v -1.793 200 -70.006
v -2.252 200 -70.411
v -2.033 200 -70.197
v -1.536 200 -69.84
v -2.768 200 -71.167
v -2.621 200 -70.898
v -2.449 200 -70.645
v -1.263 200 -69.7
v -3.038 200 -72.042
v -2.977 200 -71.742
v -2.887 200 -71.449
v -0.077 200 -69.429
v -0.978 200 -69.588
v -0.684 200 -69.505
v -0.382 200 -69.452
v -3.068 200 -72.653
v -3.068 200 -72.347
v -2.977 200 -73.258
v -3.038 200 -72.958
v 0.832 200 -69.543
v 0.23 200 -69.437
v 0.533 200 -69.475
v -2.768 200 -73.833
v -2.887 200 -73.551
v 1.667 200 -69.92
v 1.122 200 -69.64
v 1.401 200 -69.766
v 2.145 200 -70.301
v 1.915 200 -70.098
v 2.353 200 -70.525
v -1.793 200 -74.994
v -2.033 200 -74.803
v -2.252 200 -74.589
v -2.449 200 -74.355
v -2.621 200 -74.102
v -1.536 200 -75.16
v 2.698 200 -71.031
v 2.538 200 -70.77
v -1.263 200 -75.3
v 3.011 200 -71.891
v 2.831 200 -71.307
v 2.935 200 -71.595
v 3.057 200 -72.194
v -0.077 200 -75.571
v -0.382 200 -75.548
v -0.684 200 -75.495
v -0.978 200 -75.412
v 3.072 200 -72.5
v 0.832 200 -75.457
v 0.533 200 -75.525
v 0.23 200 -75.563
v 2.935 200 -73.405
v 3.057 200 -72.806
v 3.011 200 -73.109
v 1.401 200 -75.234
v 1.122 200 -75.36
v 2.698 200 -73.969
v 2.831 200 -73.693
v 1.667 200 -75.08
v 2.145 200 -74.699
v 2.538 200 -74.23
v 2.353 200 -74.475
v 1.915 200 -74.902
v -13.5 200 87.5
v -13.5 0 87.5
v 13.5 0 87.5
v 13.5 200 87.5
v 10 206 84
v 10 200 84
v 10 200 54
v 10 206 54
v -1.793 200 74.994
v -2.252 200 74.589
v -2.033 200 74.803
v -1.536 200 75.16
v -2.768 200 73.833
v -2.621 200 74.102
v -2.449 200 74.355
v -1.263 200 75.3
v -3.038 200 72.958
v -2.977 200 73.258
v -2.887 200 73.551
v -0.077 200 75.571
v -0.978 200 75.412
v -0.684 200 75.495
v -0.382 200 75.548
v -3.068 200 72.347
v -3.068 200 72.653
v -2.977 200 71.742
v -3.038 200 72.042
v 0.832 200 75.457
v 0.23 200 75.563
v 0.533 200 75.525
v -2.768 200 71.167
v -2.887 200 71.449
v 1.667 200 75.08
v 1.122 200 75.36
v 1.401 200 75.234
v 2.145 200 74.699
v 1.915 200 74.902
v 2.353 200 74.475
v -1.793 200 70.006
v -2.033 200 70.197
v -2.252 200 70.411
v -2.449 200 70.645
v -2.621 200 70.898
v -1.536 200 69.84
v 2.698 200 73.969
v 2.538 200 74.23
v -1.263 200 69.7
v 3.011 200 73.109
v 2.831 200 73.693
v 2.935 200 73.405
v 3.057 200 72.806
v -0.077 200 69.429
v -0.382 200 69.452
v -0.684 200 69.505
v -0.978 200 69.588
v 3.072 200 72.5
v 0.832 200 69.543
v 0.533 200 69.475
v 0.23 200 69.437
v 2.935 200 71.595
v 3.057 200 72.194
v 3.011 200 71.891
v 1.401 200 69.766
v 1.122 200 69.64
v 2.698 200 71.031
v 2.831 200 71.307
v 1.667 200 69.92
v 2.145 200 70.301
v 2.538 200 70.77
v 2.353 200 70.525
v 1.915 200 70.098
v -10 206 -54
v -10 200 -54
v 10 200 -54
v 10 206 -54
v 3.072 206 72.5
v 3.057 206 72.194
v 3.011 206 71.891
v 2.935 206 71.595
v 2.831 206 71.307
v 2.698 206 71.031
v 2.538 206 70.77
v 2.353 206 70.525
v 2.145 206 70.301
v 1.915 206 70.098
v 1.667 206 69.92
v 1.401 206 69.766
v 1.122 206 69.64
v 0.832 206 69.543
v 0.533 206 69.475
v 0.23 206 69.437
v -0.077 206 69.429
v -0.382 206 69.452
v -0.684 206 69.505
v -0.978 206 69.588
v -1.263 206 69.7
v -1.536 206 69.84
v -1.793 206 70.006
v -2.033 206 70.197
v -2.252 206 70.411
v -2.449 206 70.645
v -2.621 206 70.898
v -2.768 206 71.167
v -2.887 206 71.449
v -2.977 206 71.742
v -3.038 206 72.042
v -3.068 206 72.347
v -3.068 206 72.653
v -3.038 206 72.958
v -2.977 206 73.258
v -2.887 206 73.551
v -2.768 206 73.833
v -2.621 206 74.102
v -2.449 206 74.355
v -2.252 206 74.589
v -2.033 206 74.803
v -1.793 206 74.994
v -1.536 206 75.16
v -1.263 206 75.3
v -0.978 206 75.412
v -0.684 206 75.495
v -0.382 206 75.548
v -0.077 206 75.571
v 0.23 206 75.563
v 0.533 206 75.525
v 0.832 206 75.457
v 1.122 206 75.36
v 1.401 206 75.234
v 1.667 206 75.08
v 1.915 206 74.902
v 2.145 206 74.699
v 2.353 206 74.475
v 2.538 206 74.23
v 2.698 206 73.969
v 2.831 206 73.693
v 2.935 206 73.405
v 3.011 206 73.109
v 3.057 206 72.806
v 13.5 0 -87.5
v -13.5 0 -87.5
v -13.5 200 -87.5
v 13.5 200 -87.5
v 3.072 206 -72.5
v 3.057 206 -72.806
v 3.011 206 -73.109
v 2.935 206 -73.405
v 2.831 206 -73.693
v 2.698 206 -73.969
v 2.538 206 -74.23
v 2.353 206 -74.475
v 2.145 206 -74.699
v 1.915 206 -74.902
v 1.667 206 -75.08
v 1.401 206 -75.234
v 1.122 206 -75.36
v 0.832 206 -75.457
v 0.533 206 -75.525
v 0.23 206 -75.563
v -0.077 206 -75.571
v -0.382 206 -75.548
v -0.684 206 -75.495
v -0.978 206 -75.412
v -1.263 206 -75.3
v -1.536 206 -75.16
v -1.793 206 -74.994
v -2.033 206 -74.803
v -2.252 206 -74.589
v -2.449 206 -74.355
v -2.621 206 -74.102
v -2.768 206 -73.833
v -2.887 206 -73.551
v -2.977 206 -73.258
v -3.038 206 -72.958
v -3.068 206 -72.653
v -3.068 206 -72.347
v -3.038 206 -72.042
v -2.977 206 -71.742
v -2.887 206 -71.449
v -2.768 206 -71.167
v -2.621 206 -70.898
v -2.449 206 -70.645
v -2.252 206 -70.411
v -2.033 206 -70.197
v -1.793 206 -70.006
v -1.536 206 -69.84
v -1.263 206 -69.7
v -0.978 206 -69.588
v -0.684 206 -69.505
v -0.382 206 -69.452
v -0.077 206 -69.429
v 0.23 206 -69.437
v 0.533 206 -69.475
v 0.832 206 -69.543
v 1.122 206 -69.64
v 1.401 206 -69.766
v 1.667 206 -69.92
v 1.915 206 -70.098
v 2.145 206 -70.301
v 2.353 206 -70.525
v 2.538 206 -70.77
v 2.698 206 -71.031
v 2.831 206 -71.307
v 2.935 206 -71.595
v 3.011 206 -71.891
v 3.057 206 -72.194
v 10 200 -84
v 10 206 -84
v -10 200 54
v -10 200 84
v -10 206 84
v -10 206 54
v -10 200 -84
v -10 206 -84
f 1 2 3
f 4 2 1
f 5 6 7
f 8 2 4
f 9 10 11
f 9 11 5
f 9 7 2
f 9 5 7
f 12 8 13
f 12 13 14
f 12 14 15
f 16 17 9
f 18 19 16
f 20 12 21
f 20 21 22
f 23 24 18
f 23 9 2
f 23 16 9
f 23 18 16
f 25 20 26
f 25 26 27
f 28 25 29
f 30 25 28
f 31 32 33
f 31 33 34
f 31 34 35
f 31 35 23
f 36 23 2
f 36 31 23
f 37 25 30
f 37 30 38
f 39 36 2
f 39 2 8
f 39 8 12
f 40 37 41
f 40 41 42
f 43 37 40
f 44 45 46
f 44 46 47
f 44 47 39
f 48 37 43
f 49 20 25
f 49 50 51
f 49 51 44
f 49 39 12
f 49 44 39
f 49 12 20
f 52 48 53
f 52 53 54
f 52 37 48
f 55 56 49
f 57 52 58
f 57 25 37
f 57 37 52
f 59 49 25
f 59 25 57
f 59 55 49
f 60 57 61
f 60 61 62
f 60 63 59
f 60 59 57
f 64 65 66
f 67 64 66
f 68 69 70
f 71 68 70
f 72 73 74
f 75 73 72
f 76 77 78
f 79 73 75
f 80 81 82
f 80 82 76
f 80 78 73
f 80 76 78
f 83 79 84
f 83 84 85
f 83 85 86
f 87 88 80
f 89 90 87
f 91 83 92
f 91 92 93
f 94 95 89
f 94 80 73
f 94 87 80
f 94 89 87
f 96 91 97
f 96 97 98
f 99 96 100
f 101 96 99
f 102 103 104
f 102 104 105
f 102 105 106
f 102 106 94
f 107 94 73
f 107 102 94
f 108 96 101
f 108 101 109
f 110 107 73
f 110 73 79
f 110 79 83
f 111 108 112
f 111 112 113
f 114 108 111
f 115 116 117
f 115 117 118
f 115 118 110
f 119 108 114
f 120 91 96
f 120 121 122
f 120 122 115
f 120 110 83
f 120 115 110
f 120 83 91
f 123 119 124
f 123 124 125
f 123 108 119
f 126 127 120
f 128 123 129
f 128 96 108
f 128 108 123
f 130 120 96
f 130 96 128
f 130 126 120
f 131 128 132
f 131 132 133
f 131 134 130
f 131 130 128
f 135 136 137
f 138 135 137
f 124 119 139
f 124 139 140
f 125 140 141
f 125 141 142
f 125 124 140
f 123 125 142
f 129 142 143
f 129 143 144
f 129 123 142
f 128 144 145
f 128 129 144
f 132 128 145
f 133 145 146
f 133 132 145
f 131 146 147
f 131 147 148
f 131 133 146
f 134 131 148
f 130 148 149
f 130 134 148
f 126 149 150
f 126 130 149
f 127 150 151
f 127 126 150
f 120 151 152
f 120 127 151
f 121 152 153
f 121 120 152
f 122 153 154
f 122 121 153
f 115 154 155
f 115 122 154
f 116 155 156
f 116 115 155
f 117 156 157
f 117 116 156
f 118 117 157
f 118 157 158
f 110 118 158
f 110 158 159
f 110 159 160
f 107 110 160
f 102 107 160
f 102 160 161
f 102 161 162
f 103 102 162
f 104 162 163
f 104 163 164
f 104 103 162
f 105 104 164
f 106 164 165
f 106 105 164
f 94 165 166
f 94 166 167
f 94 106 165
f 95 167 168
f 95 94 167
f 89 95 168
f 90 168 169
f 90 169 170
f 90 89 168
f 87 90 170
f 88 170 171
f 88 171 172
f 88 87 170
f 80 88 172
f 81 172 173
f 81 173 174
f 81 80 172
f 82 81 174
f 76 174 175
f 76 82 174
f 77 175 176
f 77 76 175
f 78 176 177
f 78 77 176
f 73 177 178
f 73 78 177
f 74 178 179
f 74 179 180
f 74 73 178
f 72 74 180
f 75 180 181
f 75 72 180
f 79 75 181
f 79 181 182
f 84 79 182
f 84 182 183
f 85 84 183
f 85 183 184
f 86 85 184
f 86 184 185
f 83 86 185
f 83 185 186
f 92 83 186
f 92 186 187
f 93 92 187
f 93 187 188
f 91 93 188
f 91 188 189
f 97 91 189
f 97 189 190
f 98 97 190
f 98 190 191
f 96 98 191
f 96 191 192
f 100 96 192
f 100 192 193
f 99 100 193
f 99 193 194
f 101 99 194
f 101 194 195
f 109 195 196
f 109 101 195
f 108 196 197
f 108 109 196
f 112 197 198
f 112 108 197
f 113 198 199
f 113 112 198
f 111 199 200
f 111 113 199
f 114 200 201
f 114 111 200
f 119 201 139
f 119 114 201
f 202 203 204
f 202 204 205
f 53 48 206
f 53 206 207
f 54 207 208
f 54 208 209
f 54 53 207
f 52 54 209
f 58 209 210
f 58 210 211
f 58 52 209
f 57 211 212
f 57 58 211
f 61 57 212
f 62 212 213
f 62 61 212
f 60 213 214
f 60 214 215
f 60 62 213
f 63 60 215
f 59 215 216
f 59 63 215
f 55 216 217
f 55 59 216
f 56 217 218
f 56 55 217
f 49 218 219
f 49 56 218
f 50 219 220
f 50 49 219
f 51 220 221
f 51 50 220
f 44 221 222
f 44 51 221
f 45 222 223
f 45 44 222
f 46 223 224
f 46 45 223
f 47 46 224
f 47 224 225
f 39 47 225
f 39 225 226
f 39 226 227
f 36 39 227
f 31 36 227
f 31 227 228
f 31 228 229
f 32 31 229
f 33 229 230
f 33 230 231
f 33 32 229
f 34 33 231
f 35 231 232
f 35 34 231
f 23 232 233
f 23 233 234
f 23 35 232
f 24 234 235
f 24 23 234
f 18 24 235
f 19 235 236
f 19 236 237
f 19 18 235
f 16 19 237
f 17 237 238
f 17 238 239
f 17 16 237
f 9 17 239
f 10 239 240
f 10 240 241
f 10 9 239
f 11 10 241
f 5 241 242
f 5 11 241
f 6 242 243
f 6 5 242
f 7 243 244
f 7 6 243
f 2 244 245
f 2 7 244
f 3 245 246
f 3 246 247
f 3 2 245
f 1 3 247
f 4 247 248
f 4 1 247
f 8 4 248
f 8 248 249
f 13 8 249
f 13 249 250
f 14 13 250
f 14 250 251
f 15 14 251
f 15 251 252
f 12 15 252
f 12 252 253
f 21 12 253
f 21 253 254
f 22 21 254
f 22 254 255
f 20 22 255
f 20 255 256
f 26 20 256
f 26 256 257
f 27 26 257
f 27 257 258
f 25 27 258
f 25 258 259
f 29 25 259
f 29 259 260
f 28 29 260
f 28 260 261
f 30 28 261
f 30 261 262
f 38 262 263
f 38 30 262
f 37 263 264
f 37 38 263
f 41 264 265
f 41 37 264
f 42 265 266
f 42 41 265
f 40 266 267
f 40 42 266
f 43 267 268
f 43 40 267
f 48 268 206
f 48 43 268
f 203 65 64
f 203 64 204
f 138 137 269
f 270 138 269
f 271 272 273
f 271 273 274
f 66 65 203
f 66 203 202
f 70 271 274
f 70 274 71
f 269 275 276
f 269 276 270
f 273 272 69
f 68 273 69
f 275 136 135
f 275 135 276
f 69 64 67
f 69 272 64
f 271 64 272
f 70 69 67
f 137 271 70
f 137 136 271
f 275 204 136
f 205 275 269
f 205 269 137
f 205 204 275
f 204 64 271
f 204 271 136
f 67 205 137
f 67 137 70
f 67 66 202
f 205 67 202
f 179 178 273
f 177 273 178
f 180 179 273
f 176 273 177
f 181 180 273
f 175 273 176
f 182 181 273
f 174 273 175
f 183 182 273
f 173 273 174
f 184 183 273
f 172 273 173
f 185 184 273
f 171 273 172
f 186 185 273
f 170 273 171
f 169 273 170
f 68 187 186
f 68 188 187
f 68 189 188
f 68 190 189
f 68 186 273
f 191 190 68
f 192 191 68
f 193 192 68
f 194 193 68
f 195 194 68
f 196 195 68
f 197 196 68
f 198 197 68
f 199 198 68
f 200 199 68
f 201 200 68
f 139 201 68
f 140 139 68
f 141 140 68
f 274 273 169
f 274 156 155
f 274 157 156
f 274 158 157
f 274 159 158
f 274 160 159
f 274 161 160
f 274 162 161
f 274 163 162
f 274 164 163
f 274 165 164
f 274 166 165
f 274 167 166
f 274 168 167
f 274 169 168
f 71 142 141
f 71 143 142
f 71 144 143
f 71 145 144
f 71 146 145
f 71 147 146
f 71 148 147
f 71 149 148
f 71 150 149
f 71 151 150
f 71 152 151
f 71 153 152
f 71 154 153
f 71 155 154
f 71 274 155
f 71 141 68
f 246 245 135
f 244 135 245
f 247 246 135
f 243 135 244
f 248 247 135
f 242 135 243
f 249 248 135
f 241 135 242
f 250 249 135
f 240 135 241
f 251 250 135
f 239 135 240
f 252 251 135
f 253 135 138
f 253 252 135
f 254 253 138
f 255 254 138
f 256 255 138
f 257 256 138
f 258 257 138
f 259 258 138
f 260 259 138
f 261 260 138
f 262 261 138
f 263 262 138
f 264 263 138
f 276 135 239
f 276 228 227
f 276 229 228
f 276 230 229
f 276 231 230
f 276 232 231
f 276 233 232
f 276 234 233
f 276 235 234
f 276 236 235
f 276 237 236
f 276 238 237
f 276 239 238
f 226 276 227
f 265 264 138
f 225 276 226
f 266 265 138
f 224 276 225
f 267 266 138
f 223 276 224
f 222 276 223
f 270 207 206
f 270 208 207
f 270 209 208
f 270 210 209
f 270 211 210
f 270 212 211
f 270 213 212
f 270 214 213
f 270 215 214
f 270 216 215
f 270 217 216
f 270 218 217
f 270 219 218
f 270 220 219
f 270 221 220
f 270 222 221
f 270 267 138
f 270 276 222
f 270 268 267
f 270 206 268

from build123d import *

# Parameters (mm, degrees)
SKETCH1_W           = 27
SKETCH1_H           = 175
BOSS_EXTRUDE1_DEPTH = 200
SKETCH2_W           = 20
SKETCH2_H           = 30
SKETCH2_R           = 3.071880825
BOSS_EXTRUDE2_DEPTH = 6


with BuildPart() as part:
    # Sketch1 → Boss-Extrude1 (new body)
    with BuildSketch(Plane(origin=(0, 0, 0), x_dir=(1, 0, 0), z_dir=(0, 1, 0))):
        Rectangle(SKETCH1_W, SKETCH1_H)
    extrude(amount=BOSS_EXTRUDE1_DEPTH)

    # Sketch2 → Boss-Extrude2 (add)
    with BuildSketch(Plane(origin=(0, 200, 0), x_dir=(1, 0, 0), z_dir=(0, 1, 0))):
        with Locations((0, -69)):
            Rectangle(SKETCH2_W, SKETCH2_H)
        with Locations((0, -72.5)):
            Circle(SKETCH2_R, mode=Mode.SUBTRACT)
        with Locations((0, 69)):
            Rectangle(SKETCH2_W, SKETCH2_H)
        with Locations((0, 72.5)):
            Circle(SKETCH2_R, mode=Mode.SUBTRACT)
    extrude(amount=BOSS_EXTRUDE2_DEPTH)


solid = part.part
